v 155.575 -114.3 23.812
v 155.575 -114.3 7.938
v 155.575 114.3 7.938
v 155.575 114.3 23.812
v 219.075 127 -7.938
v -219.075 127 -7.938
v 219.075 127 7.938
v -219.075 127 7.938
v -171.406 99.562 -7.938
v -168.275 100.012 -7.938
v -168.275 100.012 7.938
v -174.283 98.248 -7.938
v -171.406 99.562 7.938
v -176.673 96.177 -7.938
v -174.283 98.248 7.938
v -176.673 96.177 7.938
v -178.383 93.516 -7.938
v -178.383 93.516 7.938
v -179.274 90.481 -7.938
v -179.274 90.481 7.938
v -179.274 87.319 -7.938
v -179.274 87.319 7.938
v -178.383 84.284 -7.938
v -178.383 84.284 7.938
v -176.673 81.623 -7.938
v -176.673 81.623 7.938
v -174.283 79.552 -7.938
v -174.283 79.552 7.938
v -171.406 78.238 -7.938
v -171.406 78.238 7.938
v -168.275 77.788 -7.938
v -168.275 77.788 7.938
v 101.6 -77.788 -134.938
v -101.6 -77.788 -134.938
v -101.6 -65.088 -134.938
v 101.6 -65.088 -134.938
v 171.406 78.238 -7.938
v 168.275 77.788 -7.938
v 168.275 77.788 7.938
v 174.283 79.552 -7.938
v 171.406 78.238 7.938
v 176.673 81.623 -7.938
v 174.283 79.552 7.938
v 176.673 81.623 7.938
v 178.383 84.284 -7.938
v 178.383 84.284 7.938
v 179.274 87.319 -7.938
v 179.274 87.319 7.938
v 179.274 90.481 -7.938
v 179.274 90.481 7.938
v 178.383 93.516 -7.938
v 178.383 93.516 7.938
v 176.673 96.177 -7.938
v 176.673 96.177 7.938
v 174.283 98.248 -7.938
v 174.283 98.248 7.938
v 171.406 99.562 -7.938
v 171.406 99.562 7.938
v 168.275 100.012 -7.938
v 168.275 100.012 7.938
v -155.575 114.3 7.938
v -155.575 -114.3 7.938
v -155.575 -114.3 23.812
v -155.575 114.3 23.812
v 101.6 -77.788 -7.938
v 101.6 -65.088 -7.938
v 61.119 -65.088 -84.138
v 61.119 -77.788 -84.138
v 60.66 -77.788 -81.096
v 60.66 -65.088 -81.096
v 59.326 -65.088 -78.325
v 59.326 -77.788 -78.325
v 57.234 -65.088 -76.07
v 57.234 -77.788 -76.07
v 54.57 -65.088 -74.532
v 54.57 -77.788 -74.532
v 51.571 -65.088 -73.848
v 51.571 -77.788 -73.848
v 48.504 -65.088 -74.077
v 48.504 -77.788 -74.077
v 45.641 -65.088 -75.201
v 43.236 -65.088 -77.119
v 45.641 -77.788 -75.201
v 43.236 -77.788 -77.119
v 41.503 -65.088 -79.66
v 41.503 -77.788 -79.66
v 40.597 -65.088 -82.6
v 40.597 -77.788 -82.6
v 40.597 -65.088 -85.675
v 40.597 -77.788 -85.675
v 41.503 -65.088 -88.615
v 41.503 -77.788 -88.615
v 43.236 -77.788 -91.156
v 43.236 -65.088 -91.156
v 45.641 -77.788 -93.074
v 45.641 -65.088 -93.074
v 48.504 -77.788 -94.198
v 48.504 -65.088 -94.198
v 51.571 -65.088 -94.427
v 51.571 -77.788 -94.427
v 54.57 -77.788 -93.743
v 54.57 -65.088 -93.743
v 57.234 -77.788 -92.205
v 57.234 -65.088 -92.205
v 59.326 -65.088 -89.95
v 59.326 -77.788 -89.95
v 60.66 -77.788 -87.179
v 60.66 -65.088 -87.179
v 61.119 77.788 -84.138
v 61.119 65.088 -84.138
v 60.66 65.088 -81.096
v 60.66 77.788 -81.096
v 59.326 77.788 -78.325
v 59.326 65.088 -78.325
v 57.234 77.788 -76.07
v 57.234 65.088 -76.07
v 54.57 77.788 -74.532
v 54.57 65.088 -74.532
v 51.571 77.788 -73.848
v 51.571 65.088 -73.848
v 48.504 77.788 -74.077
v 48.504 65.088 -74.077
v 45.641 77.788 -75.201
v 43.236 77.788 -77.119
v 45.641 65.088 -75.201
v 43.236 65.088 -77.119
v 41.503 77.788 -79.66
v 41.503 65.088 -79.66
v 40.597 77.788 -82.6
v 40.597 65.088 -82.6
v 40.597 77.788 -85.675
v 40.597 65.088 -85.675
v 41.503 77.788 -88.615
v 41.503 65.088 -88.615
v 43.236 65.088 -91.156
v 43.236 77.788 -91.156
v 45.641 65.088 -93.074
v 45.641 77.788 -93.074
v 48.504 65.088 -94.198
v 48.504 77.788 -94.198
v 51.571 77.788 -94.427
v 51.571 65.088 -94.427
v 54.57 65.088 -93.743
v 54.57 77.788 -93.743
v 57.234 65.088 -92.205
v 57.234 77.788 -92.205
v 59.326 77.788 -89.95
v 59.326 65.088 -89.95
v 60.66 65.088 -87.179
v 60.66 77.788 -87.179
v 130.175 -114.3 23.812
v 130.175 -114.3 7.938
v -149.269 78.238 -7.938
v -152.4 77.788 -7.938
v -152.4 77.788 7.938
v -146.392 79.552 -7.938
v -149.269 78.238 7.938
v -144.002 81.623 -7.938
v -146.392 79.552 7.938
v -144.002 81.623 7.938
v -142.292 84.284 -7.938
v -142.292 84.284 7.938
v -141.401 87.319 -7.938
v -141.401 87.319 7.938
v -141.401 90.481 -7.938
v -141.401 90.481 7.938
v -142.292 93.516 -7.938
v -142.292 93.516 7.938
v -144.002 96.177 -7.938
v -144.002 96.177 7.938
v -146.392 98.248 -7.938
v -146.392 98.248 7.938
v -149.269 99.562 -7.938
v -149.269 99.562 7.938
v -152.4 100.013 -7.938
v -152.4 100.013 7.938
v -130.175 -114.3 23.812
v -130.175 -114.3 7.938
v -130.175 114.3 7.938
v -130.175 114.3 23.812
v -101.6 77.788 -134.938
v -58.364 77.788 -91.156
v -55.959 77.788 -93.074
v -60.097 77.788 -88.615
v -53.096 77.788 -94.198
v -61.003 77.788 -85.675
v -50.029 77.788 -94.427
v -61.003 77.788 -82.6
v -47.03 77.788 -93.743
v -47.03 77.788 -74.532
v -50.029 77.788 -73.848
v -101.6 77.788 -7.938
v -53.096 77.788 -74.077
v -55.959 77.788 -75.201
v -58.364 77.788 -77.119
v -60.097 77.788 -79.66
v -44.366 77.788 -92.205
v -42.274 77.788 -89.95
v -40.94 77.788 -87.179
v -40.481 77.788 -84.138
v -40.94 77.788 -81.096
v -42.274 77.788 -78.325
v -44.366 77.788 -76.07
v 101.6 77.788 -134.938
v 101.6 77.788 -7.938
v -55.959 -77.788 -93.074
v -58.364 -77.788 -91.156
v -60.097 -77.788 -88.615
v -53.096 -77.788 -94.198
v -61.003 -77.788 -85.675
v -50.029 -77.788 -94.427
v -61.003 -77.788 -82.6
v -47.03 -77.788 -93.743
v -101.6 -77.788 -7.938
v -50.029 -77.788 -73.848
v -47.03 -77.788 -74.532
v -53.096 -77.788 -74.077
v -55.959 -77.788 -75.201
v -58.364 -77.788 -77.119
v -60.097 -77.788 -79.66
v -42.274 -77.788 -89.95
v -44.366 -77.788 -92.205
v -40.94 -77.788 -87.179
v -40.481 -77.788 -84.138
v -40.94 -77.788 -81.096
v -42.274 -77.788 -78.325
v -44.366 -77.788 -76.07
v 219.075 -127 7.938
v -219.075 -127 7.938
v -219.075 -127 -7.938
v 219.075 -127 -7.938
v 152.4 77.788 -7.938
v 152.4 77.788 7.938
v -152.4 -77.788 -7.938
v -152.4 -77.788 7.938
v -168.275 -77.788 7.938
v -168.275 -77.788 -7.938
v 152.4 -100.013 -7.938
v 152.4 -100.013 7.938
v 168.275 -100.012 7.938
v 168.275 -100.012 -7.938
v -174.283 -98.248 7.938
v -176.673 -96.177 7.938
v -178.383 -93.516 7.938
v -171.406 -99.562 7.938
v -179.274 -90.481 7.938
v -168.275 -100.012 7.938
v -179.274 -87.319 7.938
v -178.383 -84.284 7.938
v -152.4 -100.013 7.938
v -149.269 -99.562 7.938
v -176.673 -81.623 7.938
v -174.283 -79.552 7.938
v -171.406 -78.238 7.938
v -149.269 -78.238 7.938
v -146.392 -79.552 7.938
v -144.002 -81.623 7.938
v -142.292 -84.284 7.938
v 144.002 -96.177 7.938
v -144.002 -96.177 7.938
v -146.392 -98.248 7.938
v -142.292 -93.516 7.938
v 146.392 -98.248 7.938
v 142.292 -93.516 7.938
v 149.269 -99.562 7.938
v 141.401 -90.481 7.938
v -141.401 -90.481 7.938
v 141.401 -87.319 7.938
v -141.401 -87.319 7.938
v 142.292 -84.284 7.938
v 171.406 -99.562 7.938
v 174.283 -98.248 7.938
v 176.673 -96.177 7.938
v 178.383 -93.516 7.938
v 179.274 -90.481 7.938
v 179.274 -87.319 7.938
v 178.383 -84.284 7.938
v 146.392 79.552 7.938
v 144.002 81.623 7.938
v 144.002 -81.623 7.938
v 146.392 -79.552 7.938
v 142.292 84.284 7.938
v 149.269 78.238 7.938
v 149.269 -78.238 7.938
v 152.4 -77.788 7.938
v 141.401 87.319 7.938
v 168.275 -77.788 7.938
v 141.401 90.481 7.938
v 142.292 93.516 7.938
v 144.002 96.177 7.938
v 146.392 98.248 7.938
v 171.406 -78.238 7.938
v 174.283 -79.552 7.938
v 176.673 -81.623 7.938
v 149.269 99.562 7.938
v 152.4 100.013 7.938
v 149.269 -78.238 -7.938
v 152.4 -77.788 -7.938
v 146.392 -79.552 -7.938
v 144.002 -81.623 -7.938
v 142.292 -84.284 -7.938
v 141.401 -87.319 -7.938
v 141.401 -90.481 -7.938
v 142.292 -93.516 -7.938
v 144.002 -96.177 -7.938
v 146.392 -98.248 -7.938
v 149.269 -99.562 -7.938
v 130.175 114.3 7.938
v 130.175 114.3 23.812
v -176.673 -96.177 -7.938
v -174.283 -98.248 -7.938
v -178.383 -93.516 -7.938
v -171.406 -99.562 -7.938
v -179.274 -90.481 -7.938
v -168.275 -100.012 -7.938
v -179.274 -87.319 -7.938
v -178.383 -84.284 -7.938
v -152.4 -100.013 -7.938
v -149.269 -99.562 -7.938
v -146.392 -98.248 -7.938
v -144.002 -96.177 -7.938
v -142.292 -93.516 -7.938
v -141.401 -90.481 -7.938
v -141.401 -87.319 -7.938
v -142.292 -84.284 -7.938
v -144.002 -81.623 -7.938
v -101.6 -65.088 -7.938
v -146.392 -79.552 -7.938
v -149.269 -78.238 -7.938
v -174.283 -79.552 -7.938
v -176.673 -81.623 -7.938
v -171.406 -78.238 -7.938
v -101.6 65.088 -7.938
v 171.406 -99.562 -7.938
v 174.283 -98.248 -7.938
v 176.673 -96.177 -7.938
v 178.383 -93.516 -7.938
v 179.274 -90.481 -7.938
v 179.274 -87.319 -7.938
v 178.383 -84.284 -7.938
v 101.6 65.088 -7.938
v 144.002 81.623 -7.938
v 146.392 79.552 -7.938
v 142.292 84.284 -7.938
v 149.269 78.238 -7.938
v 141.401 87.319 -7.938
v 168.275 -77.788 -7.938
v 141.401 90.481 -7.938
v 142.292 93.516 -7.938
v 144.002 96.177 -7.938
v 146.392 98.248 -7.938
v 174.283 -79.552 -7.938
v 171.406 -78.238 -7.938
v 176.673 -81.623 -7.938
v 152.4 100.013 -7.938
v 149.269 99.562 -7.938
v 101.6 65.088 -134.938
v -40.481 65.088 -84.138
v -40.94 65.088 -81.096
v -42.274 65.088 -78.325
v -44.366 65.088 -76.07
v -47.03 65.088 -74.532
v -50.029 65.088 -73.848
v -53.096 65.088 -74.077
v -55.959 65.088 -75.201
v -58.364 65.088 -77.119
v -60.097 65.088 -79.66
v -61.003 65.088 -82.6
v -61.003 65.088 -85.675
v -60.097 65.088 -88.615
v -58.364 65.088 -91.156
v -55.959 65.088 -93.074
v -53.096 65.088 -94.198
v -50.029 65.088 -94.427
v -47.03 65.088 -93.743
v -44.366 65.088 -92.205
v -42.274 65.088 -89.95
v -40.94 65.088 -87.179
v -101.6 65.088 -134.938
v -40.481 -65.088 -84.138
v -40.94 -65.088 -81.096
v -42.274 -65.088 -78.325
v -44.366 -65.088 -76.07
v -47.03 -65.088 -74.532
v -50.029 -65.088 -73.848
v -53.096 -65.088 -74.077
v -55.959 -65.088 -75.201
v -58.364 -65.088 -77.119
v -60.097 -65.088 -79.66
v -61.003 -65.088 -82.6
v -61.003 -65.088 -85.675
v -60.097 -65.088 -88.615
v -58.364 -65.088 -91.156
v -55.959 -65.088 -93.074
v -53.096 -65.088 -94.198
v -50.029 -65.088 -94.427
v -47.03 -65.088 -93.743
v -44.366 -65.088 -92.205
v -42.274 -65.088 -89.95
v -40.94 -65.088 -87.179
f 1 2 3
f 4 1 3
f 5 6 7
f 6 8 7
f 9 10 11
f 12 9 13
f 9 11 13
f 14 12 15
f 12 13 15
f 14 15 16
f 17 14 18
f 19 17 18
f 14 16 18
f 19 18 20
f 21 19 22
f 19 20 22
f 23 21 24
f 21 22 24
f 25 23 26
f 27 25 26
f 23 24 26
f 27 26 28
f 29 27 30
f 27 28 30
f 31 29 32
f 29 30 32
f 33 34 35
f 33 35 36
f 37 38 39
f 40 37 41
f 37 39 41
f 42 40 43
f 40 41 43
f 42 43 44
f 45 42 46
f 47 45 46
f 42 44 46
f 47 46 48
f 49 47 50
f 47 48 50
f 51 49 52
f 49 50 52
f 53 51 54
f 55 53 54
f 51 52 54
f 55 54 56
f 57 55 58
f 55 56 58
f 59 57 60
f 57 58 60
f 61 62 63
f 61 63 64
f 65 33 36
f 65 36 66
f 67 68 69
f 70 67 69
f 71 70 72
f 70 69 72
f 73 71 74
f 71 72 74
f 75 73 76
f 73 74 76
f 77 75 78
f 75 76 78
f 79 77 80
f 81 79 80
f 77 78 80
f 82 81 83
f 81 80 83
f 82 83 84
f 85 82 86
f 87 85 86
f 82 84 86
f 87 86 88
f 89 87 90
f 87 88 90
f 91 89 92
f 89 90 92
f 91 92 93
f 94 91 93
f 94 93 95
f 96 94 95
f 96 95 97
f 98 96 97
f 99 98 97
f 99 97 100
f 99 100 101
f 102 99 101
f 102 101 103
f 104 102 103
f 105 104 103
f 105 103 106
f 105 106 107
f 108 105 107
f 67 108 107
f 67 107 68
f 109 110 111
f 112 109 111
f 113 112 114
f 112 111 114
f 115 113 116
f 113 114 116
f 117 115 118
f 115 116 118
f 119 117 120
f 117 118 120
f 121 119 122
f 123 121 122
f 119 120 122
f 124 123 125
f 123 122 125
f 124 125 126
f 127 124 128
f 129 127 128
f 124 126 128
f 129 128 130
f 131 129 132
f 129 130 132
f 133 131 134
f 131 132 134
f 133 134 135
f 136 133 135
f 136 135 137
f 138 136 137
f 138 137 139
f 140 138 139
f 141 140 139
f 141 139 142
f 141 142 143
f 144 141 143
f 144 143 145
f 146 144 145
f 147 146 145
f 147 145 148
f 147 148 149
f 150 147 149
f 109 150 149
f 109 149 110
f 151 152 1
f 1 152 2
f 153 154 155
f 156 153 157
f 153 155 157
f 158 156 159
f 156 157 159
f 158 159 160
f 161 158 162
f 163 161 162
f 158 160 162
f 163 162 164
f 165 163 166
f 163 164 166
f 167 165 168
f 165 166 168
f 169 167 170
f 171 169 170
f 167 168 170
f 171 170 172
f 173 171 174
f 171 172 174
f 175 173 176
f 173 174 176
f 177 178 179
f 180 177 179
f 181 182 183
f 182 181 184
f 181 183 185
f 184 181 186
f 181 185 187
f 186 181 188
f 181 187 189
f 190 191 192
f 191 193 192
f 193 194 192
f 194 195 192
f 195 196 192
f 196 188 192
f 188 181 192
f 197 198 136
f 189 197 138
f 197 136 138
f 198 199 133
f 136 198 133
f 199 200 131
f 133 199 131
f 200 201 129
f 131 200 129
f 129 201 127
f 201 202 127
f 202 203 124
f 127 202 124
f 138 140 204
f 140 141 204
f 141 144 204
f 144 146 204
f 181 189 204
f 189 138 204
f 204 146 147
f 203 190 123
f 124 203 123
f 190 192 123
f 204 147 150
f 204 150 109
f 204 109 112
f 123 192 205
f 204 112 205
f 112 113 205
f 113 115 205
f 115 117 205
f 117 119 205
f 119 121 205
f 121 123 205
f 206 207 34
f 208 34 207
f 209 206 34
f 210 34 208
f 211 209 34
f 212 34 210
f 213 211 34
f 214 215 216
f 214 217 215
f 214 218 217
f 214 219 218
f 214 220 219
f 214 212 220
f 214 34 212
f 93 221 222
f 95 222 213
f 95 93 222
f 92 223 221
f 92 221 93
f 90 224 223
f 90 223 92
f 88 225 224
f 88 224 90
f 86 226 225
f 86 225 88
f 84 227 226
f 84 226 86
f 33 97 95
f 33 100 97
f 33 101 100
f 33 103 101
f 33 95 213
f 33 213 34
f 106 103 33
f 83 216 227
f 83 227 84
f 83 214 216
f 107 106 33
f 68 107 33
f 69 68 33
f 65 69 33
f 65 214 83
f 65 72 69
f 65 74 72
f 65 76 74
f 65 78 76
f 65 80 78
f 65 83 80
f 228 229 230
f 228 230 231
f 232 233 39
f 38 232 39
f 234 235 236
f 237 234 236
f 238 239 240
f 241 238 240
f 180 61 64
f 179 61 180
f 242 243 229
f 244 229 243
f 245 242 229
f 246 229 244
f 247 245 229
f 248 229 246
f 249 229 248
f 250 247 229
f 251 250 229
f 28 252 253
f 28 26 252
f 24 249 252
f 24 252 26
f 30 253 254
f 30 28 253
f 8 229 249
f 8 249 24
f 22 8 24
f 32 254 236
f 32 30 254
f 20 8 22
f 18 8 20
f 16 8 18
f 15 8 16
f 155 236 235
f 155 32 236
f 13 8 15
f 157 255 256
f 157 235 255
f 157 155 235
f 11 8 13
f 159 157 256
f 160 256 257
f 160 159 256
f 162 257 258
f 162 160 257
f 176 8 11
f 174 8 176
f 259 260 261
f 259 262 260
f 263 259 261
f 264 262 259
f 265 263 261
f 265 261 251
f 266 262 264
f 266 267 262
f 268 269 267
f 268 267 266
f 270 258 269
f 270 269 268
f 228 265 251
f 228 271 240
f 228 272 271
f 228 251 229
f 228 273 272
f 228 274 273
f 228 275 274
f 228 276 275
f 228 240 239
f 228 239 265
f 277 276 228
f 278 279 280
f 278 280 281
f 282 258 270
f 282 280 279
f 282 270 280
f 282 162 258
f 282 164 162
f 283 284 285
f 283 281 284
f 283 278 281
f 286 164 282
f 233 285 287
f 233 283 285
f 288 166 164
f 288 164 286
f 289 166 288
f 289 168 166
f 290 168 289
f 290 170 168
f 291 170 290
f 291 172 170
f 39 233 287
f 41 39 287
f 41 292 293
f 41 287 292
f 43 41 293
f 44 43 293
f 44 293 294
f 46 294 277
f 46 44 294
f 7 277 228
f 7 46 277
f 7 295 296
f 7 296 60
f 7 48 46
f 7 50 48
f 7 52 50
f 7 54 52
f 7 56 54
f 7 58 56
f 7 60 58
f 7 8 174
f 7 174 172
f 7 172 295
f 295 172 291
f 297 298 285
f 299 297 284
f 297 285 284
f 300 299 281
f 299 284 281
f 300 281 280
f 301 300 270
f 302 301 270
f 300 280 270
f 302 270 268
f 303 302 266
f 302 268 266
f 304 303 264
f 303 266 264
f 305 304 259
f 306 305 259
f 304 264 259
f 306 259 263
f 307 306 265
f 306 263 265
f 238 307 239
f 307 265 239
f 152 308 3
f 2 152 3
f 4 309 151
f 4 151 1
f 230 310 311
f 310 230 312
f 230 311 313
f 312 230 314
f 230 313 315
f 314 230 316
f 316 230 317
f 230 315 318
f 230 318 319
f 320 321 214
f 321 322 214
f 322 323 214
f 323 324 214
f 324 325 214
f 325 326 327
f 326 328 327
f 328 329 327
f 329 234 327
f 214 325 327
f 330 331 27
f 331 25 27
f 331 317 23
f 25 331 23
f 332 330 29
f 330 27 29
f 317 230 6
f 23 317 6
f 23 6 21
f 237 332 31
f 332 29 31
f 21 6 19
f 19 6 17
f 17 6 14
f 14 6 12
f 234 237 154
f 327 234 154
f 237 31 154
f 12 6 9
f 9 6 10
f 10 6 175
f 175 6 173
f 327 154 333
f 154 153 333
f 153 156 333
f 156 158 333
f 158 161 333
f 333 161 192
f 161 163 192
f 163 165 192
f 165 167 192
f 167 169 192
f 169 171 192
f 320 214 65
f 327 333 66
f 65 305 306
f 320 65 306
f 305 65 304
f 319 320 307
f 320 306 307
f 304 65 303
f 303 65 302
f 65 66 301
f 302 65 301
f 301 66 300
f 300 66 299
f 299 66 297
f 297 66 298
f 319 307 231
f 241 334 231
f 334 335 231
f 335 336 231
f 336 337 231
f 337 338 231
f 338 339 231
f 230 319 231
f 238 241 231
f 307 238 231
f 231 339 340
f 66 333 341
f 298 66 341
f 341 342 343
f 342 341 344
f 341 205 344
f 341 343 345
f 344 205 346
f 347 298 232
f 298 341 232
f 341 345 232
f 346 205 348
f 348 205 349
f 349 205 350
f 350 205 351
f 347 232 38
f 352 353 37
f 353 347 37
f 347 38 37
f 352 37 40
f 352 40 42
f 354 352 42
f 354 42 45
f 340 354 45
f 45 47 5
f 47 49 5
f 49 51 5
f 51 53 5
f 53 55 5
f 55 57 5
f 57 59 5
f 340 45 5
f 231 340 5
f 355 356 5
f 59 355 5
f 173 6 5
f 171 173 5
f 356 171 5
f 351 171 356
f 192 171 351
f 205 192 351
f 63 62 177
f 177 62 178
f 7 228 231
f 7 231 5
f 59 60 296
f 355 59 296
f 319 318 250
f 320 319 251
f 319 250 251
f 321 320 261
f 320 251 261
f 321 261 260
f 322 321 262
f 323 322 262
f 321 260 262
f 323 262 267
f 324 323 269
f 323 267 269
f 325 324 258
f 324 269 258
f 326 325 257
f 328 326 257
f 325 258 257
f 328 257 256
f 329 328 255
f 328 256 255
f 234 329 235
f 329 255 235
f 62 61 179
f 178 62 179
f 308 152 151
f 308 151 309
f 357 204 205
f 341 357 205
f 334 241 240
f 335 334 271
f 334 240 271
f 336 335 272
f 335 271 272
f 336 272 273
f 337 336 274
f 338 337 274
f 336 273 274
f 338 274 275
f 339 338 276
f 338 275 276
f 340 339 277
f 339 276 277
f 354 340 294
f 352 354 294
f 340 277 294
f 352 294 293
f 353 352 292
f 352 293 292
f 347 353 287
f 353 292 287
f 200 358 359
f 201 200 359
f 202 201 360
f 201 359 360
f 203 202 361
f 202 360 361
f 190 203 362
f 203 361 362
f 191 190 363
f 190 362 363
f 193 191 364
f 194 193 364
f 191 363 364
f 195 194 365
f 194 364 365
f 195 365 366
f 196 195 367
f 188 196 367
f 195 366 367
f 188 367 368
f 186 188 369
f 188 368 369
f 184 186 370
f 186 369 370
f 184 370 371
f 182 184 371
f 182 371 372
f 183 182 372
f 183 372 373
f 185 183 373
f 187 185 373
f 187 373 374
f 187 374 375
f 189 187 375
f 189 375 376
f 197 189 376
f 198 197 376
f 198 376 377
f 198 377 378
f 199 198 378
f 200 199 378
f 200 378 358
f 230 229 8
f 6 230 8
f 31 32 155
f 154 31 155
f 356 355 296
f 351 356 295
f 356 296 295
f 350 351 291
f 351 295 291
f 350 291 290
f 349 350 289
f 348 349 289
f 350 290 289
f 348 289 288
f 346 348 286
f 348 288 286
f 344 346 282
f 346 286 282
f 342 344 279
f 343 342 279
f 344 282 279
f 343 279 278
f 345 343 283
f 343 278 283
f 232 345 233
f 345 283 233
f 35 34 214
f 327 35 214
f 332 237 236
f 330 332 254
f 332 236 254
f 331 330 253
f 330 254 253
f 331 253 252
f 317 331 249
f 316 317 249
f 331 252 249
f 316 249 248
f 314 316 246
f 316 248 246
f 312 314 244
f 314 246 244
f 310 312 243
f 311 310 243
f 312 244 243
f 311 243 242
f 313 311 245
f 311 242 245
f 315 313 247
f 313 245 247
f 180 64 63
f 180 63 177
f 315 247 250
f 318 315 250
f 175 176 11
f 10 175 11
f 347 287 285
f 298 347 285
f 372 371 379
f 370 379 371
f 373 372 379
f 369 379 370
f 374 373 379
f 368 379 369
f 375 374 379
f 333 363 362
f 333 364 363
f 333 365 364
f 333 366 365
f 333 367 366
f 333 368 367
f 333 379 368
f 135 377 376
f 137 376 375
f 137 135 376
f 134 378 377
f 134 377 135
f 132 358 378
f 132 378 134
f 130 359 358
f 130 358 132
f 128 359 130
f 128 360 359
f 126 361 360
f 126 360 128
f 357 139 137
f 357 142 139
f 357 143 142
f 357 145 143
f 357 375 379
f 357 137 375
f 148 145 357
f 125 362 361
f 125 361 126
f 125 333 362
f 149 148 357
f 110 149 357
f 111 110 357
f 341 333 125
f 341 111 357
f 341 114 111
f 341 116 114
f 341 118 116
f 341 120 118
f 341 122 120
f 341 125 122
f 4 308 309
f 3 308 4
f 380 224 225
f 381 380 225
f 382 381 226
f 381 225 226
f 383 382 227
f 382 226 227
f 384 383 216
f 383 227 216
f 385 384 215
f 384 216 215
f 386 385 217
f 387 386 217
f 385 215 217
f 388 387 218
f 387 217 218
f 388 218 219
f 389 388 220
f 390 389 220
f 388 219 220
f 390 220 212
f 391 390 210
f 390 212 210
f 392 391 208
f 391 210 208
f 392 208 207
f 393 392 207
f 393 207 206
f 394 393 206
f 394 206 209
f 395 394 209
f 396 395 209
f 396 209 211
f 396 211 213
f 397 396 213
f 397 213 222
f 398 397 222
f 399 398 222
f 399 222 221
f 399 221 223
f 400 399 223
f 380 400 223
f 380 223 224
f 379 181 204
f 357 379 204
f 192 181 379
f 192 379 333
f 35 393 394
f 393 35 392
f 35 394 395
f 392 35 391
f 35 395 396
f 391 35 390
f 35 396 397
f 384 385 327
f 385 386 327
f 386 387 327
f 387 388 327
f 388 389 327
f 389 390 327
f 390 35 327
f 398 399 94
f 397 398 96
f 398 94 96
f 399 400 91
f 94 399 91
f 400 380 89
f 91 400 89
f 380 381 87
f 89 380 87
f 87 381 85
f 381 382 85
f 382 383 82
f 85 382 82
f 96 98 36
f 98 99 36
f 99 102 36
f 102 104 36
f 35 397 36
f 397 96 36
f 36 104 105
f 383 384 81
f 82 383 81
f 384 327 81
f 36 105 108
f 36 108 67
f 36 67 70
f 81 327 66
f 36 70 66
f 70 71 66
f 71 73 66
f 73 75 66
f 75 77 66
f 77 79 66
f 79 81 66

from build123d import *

# Parameters (mm, degrees)
F0_W      = 438.15
F0_H      = 254
F1_DEPTH  = 7.9375
F2_W      = 203.2
F2_H      = 127
F3_DEPTH  = 6.35
F7_W      = 25.4
F7_H      = 228.6
F8_DEPTH  = 15.875
F10_DEPTH = 142.876
F11_R     = 10.31875
F12_DEPTH = 204.7885


with BuildPart() as f1:
    # F0 (on Top) → F1 (new body, symmetric)
    with BuildSketch(Plane.XY):
        Rectangle(F0_W, F0_H)
    extrude(amount=F1_DEPTH, both=True)



with BuildPart() as f3:
    # F2 (on Front) → F3 (new body, symmetric)
    with BuildSketch(Plane.XZ):
        with Locations((0, -71.4375)):
            Rectangle(F2_W, F2_H)
    extrude(amount=F3_DEPTH, both=True)


with BuildPart() as f3_1:
    # F4: moved
    add(f3.part.moved(Location((0, -71.4375, 0))))


with BuildPart() as f1_1:
    add(f1.part)

    add(f3_1.part)  # F6 merges F3
    # F6: F3 across plane
    add(f3_1.part.mirror(Plane.XZ))

    # F9 (on face) → F10 (cut, through all)
    with BuildSketch(Plane.XY.offset(7.9375)):
        with BuildLine():
            Line((-152.4, -77.7875), (-168.275, -77.7875))
            ThreePointArc((-168.275, -77.7875), (-179.3875, -88.9), (-168.275, -100.0125))
            Line((-168.275, -100.0125), (-152.4, -100.0125))
            ThreePointArc((-152.4, -100.0125), (-141.2875, -88.9), (-152.4, -77.7875))
        make_face()
        with BuildLine():
            ThreePointArc((-168.275, 100.0125), (-179.3875, 88.9), (-168.275, 77.7875))
            Line((-168.275, 77.7875), (-152.4, 77.7875))
            ThreePointArc((-152.4, 77.7875), (-141.2875, 88.9), (-152.4, 100.0125))
            Line((-152.4, 100.0125), (-168.275, 100.0125))
        make_face()
        with BuildLine():
            Line((152.4, 77.7875), (168.275, 77.7875))
            ThreePointArc((168.275, 77.7875), (179.3875, 88.9), (168.275, 100.0125))
            Line((168.275, 100.0125), (152.4, 100.0125))
            ThreePointArc((152.4, 100.0125), (141.2875, 88.9), (152.4, 77.7875))
        make_face()
        with BuildLine():
            ThreePointArc((168.275, -100.0125), (179.3875, -88.9), (168.275, -77.7875))
            Line((168.275, -77.7875), (152.4, -77.7875))
            ThreePointArc((152.4, -77.7875), (141.2875, -88.9), (152.4, -100.0125))
            Line((152.4, -100.0125), (168.275, -100.0125))
        make_face()
    extrude(amount=-F10_DEPTH, mode=Mode.SUBTRACT)

    # F11 (on face) → F12 (cut, through all)
    with BuildSketch(Plane.XZ.offset(77.7875)):
        with Locations((-50.8, -84.1375)):
            Circle(F11_R)
        with Locations((50.8, -84.1375)):
            Circle(F11_R)
    extrude(amount=-F12_DEPTH, mode=Mode.SUBTRACT)


with BuildPart() as f8:
    # F7 (on face) → F8 (new body)
    with BuildSketch(Plane.XY.offset(7.9375)):
        with Locations((-142.875, 0)):
            Rectangle(F7_W, F7_H)
    extrude(amount=F8_DEPTH)


with BuildPart() as f8b:
    # F7 (on face) → F8, piece 2 (new body)
    with BuildSketch(Plane.XY.offset(7.9375)):
        with Locations((142.875, 0)):
            Rectangle(F7_W, F7_H)
    extrude(amount=F8_DEPTH)


solid = Compound([f1_1.part, f8.part, f8b.part])
